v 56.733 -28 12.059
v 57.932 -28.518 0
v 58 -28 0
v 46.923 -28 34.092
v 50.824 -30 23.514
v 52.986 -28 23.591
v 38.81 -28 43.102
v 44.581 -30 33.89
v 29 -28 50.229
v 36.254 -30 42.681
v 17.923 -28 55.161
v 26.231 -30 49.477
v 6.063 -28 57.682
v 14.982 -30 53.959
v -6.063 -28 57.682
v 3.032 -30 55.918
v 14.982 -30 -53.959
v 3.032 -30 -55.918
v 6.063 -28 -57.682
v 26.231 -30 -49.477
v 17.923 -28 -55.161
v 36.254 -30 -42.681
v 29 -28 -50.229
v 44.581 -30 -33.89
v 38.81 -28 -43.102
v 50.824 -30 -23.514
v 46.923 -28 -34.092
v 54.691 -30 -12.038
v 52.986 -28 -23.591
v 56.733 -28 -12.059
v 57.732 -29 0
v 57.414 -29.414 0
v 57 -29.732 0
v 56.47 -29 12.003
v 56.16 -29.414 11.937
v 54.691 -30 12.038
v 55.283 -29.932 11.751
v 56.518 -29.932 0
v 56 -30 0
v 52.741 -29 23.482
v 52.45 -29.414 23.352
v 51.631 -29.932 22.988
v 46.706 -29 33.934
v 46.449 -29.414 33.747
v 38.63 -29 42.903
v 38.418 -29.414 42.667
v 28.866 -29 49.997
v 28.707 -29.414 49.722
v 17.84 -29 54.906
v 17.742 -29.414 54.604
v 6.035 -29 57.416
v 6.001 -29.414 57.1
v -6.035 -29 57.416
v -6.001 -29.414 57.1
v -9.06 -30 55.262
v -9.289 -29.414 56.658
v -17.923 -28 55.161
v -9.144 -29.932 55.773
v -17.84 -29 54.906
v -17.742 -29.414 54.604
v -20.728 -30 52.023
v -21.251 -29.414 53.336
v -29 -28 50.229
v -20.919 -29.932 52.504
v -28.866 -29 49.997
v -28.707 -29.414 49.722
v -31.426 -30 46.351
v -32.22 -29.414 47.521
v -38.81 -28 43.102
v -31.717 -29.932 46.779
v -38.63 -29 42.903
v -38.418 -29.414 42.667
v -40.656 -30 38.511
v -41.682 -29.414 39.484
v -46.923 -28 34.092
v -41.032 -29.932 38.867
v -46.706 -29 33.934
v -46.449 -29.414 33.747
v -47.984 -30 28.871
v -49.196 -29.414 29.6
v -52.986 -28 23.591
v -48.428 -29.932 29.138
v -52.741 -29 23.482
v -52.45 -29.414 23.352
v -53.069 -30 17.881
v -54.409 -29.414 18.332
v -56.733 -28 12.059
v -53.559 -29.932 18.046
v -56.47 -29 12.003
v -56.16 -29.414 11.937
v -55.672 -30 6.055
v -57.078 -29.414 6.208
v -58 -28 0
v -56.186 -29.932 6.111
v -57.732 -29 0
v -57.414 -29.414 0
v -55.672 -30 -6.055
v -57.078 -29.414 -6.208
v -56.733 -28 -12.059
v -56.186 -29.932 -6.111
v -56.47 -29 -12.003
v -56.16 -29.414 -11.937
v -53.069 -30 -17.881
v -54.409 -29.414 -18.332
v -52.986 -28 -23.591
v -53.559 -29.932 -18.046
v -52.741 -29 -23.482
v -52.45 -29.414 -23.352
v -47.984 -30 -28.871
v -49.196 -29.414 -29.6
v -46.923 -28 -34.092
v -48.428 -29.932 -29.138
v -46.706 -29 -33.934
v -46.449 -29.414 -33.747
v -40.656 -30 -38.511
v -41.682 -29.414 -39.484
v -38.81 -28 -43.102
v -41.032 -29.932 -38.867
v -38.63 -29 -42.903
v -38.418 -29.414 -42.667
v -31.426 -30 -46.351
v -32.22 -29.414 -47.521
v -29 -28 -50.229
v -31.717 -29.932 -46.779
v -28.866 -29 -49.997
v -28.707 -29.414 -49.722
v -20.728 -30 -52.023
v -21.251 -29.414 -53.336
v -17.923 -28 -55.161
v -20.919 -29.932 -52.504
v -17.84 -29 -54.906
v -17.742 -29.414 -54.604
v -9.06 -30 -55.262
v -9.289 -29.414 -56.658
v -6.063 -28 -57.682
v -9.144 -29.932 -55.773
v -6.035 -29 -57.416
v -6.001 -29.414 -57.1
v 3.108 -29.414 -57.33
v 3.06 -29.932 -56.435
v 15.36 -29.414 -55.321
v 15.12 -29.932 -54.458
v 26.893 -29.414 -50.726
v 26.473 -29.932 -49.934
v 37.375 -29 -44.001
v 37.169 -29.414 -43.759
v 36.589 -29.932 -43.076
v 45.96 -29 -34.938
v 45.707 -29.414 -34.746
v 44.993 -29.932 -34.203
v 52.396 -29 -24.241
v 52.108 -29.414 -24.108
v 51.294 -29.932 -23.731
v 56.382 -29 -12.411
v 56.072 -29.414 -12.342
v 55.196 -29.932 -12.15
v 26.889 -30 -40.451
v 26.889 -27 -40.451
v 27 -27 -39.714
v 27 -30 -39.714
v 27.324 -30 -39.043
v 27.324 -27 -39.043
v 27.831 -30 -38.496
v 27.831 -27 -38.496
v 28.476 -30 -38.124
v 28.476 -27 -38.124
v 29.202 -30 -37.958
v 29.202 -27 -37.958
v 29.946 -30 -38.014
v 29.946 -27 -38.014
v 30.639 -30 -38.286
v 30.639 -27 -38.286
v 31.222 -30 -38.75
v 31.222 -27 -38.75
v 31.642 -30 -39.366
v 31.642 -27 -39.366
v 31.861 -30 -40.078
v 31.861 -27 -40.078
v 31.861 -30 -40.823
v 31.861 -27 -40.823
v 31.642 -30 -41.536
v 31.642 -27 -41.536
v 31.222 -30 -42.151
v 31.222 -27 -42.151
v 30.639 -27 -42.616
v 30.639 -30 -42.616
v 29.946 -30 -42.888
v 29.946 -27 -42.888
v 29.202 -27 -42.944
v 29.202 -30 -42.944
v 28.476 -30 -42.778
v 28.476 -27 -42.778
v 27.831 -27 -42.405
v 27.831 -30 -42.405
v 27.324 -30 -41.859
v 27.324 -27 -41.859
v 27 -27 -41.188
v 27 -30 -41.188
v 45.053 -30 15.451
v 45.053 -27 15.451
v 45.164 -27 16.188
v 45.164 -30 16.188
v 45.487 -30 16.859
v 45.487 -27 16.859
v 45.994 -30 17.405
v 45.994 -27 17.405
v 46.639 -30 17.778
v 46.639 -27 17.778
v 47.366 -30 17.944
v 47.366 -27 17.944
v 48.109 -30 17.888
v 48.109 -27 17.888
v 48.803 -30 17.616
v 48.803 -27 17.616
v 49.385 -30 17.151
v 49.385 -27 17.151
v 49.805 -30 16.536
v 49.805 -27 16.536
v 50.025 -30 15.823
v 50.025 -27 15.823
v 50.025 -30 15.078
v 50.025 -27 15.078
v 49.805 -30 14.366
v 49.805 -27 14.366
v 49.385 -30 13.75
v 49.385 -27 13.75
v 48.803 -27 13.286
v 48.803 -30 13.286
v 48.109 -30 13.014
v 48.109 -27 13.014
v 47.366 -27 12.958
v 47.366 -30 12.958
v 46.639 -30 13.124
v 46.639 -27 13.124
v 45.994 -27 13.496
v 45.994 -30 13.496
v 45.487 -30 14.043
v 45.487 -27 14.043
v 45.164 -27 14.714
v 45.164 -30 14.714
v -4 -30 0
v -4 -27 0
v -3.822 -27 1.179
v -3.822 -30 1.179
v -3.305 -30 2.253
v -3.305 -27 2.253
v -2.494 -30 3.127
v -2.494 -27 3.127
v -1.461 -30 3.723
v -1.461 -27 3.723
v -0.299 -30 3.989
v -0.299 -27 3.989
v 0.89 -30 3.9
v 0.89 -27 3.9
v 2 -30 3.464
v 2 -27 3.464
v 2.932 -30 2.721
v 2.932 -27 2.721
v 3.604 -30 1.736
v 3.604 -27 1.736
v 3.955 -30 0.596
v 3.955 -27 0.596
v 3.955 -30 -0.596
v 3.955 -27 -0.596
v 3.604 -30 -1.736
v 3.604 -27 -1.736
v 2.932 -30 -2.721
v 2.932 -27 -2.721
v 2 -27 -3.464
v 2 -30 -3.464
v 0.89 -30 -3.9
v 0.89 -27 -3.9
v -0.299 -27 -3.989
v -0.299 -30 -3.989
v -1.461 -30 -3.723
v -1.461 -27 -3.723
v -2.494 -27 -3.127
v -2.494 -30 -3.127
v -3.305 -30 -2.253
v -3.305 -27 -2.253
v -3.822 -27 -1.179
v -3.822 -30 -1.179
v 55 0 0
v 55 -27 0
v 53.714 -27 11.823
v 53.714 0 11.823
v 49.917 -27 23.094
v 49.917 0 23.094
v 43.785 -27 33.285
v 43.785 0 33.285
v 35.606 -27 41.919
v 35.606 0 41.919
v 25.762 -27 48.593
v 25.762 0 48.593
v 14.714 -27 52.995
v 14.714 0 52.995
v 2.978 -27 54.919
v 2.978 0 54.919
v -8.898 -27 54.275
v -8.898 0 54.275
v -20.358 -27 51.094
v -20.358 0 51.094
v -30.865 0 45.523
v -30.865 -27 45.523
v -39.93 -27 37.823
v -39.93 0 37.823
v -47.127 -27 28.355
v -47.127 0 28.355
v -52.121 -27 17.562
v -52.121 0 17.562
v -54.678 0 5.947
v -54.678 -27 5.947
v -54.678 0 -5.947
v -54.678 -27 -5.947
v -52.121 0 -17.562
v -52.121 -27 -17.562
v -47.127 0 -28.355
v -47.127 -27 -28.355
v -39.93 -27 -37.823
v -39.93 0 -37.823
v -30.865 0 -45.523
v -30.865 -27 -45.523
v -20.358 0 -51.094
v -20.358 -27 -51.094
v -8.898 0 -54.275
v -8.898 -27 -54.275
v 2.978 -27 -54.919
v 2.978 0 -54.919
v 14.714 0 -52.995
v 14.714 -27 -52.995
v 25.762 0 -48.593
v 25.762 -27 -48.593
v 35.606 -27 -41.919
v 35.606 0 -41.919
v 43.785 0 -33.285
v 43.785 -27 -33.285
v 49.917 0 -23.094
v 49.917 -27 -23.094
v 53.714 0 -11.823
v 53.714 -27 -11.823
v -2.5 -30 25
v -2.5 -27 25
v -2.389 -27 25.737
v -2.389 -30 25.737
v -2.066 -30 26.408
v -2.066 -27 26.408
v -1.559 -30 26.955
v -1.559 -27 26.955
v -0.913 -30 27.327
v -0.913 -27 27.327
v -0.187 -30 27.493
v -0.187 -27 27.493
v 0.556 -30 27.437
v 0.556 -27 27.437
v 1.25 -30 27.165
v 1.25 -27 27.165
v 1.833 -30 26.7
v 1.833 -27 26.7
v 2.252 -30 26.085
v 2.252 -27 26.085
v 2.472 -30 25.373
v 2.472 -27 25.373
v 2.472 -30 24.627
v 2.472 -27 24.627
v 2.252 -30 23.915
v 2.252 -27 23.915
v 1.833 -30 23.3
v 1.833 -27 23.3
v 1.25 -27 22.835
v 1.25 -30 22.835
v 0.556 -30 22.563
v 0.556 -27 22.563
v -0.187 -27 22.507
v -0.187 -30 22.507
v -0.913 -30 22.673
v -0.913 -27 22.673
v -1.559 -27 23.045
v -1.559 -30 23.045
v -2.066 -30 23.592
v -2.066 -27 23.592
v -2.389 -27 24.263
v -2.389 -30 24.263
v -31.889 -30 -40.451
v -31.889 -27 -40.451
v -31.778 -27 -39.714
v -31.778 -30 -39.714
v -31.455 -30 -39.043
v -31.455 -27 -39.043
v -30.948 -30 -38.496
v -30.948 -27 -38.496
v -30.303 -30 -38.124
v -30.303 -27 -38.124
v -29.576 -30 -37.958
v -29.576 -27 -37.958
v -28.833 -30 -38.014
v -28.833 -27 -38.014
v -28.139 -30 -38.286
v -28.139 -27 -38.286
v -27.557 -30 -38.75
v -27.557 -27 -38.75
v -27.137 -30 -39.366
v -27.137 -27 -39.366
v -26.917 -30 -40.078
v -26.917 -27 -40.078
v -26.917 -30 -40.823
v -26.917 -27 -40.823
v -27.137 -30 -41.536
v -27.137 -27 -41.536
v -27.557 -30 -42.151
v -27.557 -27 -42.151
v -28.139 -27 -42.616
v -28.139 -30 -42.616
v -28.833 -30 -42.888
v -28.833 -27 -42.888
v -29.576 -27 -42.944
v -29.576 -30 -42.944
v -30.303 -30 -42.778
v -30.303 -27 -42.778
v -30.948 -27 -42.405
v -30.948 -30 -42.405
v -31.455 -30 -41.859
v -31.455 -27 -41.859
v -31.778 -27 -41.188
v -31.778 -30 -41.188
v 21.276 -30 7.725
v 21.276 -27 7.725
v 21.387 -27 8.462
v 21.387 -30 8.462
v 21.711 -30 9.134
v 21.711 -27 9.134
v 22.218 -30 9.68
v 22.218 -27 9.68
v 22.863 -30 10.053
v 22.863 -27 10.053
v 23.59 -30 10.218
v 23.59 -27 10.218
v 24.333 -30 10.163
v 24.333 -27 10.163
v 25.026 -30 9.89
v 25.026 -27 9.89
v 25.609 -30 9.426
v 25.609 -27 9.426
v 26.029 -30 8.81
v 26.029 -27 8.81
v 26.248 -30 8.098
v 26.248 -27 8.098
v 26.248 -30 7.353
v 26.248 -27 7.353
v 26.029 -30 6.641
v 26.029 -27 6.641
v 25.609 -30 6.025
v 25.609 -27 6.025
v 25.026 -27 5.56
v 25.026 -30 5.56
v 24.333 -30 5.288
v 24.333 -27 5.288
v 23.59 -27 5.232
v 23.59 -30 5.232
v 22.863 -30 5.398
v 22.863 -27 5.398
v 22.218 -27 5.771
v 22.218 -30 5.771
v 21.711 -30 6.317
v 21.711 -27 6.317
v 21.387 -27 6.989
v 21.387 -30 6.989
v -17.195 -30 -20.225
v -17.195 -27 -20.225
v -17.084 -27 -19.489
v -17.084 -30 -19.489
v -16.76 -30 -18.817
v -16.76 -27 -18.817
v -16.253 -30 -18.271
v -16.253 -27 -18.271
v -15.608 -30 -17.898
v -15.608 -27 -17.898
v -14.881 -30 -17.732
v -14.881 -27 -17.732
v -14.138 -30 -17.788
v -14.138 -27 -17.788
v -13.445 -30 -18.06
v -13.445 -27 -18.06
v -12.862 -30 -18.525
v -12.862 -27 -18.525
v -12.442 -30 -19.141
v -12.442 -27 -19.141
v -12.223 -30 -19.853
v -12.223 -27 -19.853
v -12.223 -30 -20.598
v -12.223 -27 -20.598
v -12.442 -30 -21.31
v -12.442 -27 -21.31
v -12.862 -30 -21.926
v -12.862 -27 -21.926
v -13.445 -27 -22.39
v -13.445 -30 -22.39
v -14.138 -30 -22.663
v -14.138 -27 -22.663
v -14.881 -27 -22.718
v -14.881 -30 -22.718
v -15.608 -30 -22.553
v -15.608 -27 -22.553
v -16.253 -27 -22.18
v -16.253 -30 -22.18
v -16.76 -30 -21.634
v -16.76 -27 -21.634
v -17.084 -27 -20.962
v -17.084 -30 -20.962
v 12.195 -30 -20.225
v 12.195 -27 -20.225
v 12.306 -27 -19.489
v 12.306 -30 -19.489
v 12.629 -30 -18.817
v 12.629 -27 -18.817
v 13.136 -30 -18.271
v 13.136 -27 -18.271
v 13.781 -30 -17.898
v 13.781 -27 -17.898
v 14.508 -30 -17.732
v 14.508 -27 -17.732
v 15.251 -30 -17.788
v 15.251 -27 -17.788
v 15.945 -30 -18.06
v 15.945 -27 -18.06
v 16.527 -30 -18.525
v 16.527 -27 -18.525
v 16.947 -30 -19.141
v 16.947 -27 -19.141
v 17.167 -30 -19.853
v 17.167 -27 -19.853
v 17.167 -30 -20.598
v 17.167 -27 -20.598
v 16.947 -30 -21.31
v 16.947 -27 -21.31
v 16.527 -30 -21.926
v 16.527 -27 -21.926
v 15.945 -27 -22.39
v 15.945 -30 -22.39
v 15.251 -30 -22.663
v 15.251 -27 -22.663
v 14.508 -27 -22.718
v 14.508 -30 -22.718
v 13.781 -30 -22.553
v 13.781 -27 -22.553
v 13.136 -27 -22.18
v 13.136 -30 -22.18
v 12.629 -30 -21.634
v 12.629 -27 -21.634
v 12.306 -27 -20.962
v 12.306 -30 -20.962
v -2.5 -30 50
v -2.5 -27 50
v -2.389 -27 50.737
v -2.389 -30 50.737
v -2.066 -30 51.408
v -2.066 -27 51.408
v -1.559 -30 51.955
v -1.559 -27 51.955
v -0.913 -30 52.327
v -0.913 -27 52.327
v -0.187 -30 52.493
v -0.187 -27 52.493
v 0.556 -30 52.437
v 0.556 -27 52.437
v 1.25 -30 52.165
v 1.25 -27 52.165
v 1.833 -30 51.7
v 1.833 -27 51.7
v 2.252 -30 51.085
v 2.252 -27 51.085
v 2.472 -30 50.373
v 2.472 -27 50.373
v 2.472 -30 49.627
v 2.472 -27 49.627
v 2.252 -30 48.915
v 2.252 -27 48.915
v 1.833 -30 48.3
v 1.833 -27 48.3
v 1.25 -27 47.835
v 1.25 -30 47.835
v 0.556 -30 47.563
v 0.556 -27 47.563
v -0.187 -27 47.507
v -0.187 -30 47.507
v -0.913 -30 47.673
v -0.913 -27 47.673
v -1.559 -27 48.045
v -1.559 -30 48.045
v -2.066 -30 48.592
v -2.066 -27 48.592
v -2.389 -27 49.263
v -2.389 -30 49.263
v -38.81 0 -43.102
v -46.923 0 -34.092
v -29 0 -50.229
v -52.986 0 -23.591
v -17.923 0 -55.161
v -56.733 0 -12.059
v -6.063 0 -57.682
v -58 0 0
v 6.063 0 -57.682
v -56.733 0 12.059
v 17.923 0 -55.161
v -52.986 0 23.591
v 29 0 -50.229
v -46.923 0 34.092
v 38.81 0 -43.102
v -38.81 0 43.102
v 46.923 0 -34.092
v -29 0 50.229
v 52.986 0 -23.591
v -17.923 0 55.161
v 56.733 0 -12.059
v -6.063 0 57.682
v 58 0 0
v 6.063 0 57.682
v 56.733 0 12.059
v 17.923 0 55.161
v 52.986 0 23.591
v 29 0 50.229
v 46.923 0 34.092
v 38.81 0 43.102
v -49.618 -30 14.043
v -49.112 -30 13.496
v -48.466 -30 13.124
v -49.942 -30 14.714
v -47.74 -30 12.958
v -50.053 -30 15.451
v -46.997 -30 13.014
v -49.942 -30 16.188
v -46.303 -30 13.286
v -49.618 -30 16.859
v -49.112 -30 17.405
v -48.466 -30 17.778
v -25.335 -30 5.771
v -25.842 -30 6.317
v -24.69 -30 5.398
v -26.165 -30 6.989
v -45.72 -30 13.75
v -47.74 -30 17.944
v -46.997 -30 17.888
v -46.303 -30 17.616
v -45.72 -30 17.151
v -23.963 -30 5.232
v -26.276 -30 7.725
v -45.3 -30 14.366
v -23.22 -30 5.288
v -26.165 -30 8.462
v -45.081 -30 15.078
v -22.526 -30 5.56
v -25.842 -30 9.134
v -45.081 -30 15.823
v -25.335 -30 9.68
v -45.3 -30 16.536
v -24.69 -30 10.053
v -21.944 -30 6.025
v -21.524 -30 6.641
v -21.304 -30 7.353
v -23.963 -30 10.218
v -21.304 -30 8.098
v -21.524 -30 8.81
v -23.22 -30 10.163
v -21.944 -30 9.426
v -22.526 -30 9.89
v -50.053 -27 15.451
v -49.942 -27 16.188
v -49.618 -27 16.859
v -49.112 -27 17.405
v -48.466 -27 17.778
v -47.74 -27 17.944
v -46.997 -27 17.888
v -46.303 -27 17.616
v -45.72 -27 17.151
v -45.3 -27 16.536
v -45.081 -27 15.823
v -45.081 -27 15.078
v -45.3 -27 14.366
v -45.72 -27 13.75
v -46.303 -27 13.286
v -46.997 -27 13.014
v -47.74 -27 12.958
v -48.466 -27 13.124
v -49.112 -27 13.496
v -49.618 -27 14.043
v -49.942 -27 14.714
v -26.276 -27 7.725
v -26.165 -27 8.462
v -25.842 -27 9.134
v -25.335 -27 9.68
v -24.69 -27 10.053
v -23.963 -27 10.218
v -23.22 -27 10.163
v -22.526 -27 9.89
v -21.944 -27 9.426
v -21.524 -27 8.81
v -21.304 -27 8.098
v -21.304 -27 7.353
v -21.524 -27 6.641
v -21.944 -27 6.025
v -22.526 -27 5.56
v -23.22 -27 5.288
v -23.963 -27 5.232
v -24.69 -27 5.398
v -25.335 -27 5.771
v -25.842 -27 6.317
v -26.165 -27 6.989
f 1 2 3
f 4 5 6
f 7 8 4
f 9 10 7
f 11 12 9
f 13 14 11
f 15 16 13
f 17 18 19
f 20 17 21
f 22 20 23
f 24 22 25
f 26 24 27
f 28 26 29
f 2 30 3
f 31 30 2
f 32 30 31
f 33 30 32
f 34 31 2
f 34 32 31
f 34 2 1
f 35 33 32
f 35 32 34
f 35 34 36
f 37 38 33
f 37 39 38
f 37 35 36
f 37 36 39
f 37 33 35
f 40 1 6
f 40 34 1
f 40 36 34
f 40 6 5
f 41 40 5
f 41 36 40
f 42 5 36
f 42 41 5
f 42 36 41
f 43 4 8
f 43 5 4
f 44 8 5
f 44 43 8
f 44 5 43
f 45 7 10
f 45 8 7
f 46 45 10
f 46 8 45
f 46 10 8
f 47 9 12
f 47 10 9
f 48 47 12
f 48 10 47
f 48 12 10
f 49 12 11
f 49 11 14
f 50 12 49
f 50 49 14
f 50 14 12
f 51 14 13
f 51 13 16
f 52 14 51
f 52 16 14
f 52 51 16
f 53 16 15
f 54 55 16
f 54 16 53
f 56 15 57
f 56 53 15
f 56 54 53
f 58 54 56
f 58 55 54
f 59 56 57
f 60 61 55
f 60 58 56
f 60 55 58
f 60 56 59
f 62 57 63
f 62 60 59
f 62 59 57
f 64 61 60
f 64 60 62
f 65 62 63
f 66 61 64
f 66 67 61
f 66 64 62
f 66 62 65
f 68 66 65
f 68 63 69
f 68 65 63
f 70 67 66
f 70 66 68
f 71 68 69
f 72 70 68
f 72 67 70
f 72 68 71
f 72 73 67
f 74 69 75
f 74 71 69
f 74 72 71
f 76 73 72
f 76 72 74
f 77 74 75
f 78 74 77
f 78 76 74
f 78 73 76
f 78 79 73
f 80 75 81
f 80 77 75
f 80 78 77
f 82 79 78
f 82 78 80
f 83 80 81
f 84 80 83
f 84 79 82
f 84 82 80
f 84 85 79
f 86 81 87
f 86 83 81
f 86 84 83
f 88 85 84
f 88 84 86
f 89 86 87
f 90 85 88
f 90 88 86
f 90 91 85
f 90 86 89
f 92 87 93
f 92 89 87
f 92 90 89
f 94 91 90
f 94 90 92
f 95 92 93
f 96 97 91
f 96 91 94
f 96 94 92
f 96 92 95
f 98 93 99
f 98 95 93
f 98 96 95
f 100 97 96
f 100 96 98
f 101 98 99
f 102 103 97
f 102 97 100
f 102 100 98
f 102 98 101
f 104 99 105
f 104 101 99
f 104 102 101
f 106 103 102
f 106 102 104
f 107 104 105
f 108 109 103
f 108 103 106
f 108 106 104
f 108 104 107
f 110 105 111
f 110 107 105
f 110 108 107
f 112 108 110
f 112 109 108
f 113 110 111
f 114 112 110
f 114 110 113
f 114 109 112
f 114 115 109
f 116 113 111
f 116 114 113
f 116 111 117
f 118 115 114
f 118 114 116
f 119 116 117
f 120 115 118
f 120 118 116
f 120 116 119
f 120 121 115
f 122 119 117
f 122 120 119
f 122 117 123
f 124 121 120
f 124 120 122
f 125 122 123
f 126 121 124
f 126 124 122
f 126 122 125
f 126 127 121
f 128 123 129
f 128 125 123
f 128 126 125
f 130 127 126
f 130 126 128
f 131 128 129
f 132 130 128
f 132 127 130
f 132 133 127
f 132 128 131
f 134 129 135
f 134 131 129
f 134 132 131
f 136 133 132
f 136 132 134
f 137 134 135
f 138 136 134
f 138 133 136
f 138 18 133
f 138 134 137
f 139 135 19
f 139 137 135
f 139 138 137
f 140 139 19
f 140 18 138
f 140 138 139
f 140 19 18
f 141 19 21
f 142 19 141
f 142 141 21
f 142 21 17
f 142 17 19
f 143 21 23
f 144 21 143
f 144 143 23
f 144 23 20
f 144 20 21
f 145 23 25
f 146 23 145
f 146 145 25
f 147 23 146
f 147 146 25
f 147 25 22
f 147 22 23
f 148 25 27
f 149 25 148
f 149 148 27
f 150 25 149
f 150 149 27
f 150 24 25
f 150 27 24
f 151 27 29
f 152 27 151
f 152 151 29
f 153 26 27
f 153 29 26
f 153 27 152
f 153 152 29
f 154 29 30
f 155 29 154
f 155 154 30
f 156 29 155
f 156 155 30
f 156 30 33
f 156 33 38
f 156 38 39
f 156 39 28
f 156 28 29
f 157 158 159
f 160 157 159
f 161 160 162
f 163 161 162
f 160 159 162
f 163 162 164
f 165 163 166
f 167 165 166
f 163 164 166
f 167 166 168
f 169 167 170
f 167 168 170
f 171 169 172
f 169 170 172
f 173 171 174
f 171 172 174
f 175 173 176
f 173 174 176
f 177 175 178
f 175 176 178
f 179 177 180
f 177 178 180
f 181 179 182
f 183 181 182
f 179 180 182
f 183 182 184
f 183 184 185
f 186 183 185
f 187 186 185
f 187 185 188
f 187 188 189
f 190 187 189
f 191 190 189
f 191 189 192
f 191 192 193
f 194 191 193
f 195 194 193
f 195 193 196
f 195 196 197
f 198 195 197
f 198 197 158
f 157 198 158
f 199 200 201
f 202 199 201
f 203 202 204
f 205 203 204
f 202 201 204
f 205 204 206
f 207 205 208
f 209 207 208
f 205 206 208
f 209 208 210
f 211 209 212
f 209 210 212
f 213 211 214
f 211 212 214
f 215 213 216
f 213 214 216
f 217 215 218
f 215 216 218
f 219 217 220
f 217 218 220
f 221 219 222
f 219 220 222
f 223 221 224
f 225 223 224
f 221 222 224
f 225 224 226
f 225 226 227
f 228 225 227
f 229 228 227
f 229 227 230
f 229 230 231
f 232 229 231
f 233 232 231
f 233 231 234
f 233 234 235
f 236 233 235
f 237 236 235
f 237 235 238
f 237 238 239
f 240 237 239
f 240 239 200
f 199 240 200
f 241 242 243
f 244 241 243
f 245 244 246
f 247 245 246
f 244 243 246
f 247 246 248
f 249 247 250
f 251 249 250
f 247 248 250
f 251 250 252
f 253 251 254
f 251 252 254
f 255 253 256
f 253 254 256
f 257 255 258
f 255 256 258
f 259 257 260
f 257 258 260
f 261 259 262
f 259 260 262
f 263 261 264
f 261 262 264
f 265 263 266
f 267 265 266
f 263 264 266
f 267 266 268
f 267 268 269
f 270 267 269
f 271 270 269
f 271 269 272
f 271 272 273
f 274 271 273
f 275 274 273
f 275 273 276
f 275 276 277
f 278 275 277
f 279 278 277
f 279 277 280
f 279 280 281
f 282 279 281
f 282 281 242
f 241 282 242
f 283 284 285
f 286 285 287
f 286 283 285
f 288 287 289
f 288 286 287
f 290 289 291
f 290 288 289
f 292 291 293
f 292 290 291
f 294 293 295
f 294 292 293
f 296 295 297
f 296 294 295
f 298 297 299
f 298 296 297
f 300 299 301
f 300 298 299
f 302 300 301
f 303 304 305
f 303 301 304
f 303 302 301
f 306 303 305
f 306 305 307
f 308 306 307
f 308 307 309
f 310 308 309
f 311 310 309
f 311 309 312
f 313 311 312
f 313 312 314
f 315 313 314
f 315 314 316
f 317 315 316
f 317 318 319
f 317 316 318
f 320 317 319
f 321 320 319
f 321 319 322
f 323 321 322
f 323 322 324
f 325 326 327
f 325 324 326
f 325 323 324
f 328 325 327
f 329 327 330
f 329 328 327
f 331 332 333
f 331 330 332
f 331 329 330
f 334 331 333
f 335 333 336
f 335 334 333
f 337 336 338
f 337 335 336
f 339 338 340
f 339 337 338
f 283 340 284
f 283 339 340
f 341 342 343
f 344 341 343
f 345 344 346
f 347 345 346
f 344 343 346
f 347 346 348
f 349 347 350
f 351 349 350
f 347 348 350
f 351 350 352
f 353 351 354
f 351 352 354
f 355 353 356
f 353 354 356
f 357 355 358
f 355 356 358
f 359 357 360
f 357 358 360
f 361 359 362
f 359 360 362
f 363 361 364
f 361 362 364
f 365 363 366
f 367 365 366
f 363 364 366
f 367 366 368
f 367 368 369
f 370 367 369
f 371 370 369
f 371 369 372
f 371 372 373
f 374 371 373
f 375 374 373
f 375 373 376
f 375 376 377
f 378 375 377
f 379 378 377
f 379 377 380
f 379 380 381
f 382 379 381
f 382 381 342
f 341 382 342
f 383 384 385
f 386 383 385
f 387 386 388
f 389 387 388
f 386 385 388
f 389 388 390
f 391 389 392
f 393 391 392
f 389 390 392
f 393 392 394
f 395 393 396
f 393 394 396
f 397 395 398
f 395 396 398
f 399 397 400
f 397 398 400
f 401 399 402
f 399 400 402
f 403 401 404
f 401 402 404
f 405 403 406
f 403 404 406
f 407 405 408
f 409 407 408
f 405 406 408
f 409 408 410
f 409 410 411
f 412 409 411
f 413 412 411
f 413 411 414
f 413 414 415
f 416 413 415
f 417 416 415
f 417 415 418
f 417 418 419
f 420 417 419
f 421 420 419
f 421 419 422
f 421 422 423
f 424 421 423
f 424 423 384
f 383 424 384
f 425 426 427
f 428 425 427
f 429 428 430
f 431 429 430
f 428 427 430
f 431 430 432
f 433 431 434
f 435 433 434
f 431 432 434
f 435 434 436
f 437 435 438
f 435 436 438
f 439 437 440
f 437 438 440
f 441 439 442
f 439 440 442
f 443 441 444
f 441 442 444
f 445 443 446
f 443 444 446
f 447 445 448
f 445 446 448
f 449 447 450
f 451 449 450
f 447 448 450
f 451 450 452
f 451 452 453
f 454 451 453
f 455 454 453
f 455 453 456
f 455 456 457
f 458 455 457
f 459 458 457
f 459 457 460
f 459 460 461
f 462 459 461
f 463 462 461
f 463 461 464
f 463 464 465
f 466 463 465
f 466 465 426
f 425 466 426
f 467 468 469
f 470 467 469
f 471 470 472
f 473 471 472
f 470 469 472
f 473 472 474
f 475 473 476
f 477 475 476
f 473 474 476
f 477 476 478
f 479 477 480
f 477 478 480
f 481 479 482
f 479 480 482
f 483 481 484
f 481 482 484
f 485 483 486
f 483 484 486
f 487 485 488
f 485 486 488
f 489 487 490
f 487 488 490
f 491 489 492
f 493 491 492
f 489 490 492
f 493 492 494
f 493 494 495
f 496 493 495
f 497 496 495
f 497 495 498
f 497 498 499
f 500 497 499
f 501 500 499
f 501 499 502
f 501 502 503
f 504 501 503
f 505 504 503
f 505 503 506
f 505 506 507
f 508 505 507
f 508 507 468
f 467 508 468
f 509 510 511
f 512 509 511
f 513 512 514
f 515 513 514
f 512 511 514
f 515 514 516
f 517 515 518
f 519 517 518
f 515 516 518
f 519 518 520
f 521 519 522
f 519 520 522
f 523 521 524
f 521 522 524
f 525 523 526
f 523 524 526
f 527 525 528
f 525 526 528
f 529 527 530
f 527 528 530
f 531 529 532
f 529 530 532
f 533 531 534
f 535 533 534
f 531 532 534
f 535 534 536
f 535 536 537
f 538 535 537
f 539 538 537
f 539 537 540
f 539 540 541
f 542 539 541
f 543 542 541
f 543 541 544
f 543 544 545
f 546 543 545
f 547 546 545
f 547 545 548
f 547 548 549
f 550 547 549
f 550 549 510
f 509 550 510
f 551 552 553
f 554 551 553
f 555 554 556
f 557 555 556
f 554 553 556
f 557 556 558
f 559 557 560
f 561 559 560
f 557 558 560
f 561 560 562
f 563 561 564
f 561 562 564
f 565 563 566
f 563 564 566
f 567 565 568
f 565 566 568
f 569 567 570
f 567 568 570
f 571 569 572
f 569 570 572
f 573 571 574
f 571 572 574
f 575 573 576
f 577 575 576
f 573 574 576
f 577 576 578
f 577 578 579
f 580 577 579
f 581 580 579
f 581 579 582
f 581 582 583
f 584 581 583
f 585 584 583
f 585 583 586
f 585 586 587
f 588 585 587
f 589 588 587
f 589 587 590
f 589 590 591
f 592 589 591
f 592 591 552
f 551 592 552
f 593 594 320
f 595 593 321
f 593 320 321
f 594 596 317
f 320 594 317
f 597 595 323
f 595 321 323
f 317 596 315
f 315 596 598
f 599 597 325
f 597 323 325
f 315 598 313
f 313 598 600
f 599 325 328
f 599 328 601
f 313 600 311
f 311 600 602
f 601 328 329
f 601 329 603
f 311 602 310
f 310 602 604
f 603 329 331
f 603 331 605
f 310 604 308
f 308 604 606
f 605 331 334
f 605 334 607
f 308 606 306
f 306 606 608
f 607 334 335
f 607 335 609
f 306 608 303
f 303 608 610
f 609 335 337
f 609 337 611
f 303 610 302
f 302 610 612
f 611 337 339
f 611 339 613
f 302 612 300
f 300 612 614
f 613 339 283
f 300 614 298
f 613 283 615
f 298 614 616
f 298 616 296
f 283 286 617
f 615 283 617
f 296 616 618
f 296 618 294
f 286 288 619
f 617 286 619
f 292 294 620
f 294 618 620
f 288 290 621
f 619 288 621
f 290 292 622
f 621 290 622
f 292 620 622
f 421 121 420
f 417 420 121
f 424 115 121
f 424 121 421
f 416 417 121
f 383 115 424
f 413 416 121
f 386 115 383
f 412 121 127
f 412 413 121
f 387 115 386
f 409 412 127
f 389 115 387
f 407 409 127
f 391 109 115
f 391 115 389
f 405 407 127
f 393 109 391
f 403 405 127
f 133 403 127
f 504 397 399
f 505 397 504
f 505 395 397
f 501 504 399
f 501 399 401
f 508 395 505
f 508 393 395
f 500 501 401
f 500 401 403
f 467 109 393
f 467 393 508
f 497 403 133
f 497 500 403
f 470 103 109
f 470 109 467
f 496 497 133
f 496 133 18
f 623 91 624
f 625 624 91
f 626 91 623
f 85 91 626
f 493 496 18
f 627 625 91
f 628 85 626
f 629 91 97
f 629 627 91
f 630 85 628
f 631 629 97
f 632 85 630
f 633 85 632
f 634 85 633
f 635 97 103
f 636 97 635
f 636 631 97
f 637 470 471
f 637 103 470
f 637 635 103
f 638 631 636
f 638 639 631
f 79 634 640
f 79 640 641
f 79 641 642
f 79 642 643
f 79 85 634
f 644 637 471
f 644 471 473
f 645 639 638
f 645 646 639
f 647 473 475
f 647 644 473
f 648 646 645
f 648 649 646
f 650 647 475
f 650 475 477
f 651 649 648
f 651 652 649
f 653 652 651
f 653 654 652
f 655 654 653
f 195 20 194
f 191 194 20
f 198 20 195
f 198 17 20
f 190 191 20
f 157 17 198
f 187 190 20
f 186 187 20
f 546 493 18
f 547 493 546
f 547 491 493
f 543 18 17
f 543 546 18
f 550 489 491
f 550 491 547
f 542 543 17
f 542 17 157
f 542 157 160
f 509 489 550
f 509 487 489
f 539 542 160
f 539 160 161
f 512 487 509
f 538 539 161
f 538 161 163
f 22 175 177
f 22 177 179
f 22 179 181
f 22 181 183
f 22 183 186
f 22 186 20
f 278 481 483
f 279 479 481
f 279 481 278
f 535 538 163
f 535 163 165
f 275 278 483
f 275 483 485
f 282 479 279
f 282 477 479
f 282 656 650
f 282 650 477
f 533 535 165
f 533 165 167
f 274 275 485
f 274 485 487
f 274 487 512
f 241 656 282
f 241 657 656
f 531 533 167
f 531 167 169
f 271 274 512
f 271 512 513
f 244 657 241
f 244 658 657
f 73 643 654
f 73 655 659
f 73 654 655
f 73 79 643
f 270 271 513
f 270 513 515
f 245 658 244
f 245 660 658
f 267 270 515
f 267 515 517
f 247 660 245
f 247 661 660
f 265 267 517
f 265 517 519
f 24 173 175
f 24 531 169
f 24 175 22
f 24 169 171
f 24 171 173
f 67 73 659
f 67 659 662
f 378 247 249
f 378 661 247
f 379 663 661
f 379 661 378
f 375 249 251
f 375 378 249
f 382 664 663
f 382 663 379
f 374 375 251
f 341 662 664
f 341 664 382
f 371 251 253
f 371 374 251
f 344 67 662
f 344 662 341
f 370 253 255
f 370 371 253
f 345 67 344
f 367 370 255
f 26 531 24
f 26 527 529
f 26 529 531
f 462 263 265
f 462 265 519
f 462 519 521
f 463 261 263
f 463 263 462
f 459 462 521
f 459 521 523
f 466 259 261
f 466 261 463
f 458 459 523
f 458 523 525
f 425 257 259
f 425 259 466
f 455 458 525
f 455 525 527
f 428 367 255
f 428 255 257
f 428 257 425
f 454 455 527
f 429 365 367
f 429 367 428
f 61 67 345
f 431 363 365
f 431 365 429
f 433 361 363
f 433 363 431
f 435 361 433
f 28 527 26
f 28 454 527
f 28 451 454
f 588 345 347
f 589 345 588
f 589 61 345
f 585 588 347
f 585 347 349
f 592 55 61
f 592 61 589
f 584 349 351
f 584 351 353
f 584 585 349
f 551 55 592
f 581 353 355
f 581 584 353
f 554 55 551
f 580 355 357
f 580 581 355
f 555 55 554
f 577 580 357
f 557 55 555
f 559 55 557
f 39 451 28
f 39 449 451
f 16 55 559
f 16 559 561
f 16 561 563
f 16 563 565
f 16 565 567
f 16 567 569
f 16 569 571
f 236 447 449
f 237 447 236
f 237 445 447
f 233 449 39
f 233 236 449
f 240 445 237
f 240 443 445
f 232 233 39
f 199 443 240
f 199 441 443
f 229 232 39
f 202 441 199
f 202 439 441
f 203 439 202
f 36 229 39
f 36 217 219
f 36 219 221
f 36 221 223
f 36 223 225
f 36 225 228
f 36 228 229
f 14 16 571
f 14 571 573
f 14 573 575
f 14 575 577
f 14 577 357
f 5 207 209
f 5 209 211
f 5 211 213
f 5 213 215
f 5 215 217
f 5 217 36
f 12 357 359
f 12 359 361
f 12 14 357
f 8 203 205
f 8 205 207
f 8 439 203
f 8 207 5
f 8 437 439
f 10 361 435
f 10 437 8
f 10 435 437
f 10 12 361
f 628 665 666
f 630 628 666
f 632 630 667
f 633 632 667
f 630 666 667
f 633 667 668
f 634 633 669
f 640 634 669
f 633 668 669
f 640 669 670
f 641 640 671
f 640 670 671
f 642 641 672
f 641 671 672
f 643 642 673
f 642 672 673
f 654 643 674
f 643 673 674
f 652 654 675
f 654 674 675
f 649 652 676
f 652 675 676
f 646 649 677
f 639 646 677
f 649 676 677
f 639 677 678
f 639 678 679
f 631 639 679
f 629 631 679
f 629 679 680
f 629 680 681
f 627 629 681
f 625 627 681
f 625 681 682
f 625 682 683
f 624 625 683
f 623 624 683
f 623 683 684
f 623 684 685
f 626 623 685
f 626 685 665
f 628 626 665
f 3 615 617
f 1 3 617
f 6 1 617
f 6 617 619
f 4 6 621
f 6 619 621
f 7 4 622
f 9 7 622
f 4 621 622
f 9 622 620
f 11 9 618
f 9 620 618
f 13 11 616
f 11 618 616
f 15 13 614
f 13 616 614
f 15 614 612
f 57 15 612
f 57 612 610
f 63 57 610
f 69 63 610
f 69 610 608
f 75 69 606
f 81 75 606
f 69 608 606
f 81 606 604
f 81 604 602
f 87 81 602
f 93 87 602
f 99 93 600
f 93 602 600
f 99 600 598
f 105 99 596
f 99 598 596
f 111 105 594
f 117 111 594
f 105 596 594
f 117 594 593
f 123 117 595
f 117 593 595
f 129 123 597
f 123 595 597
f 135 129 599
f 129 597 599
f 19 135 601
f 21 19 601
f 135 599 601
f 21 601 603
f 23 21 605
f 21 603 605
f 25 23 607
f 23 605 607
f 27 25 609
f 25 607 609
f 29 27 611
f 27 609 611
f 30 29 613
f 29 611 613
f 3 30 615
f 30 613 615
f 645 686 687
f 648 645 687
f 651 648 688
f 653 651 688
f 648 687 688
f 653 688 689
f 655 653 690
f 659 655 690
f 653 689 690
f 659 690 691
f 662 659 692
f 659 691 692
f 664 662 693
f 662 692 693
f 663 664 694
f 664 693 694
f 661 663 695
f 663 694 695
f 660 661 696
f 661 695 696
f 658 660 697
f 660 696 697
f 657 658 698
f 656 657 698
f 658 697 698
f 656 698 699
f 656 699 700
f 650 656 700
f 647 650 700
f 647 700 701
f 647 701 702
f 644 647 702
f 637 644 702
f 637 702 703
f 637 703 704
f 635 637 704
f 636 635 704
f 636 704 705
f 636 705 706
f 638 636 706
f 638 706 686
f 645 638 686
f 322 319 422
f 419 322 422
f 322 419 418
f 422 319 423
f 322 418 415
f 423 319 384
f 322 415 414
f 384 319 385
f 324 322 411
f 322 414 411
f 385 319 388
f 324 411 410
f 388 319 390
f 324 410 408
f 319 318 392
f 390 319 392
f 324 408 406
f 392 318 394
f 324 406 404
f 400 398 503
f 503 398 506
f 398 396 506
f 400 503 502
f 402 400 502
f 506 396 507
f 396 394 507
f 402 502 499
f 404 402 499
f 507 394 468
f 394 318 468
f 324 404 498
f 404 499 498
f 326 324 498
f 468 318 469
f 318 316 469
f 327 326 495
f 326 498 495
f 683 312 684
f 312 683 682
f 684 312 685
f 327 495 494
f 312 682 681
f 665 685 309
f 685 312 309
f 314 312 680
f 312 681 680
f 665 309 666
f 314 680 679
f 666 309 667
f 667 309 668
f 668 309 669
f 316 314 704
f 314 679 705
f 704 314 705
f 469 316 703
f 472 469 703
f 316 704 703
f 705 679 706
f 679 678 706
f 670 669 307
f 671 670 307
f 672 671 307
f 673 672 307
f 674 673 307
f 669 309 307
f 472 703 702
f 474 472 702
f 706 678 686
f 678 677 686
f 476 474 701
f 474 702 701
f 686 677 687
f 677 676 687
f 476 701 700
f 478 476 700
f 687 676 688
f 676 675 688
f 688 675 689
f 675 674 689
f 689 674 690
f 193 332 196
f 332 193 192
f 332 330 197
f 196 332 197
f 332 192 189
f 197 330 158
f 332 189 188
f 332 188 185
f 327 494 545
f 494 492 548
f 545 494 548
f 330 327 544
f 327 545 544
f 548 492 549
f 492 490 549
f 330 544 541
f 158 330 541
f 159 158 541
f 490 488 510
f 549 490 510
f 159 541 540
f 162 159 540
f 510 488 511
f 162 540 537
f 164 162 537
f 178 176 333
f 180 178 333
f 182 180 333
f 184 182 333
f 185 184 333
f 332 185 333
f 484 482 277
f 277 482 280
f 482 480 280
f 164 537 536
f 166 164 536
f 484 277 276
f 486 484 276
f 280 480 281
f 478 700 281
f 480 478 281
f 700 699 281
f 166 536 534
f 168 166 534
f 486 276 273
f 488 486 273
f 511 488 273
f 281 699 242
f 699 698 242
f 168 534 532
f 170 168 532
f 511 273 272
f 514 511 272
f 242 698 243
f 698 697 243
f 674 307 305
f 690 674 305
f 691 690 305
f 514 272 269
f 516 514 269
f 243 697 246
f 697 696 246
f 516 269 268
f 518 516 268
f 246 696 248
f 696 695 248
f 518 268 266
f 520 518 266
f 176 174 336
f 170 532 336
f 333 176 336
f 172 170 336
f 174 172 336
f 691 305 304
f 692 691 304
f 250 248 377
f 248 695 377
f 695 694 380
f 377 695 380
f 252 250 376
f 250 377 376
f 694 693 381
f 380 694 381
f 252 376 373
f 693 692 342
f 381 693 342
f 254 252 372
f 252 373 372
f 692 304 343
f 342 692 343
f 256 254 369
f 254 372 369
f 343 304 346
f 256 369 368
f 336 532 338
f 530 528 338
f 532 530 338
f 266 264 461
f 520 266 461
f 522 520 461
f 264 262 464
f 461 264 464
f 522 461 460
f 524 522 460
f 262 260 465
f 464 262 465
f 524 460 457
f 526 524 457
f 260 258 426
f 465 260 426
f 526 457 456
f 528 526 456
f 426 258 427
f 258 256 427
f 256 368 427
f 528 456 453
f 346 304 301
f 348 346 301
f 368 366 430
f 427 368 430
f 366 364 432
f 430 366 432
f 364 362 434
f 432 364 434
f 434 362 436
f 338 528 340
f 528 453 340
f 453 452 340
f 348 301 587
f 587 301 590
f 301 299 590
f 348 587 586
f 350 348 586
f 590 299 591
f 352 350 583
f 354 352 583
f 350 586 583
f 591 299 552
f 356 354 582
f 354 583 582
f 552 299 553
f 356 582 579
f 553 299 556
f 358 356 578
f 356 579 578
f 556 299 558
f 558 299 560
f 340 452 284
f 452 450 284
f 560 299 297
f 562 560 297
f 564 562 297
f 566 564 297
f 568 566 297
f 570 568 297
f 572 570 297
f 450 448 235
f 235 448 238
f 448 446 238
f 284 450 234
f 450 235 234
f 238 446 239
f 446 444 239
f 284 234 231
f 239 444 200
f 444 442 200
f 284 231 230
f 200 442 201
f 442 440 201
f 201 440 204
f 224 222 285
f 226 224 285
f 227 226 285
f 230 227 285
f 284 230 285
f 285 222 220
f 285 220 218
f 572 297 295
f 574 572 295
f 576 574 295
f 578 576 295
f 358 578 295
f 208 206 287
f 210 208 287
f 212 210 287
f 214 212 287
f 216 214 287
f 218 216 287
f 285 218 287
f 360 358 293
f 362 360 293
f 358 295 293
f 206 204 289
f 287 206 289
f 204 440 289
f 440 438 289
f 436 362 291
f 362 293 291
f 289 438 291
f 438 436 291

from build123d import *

# Parameters (mm, degrees)
F0_R     = 58
F1_DEPTH = 30
F2_T     = -3
F3_R     = 2
F5_D     = 8
F7_D     = 5


with BuildPart() as f1:
    # F0 (on Front) → F1 (new body)
    with BuildSketch(Plane.XZ):
        Circle(F0_R)
    extrude(amount=F1_DEPTH)

    # F2
    f2_openings = [f1.faces().sort_by_distance(p)[0] for p in [
        (0, 0, 0),
    ]]
    offset(amount=F2_T, openings=f2_openings)

    # F3
    f3_edges = [f1.edges().sort_by_distance(p)[0] for p in [
        (-58, -30, 0),
    ]]
    fillet(f3_edges, radius=F3_R)

    # F5 (through all)
    with Locations(Plane.XZ.offset(30)):
        with Locations((0, 0)):
            Hole(F5_D / 2)

    # F7 (through all)
    with Locations(Plane.XZ.offset(30)):
        with Locations((0, 25), (0, 50), (-23.776413, 7.725425), (-47.552826, 15.45085), (-29.389263, -40.45085), (-14.694631, -20.225425), (14.694631, -20.225425), (29.389263, -40.45085), (23.776413, 7.725425), (47.552826, 15.45085)):
            Hole(F7_D / 2)


solid = f1.part
